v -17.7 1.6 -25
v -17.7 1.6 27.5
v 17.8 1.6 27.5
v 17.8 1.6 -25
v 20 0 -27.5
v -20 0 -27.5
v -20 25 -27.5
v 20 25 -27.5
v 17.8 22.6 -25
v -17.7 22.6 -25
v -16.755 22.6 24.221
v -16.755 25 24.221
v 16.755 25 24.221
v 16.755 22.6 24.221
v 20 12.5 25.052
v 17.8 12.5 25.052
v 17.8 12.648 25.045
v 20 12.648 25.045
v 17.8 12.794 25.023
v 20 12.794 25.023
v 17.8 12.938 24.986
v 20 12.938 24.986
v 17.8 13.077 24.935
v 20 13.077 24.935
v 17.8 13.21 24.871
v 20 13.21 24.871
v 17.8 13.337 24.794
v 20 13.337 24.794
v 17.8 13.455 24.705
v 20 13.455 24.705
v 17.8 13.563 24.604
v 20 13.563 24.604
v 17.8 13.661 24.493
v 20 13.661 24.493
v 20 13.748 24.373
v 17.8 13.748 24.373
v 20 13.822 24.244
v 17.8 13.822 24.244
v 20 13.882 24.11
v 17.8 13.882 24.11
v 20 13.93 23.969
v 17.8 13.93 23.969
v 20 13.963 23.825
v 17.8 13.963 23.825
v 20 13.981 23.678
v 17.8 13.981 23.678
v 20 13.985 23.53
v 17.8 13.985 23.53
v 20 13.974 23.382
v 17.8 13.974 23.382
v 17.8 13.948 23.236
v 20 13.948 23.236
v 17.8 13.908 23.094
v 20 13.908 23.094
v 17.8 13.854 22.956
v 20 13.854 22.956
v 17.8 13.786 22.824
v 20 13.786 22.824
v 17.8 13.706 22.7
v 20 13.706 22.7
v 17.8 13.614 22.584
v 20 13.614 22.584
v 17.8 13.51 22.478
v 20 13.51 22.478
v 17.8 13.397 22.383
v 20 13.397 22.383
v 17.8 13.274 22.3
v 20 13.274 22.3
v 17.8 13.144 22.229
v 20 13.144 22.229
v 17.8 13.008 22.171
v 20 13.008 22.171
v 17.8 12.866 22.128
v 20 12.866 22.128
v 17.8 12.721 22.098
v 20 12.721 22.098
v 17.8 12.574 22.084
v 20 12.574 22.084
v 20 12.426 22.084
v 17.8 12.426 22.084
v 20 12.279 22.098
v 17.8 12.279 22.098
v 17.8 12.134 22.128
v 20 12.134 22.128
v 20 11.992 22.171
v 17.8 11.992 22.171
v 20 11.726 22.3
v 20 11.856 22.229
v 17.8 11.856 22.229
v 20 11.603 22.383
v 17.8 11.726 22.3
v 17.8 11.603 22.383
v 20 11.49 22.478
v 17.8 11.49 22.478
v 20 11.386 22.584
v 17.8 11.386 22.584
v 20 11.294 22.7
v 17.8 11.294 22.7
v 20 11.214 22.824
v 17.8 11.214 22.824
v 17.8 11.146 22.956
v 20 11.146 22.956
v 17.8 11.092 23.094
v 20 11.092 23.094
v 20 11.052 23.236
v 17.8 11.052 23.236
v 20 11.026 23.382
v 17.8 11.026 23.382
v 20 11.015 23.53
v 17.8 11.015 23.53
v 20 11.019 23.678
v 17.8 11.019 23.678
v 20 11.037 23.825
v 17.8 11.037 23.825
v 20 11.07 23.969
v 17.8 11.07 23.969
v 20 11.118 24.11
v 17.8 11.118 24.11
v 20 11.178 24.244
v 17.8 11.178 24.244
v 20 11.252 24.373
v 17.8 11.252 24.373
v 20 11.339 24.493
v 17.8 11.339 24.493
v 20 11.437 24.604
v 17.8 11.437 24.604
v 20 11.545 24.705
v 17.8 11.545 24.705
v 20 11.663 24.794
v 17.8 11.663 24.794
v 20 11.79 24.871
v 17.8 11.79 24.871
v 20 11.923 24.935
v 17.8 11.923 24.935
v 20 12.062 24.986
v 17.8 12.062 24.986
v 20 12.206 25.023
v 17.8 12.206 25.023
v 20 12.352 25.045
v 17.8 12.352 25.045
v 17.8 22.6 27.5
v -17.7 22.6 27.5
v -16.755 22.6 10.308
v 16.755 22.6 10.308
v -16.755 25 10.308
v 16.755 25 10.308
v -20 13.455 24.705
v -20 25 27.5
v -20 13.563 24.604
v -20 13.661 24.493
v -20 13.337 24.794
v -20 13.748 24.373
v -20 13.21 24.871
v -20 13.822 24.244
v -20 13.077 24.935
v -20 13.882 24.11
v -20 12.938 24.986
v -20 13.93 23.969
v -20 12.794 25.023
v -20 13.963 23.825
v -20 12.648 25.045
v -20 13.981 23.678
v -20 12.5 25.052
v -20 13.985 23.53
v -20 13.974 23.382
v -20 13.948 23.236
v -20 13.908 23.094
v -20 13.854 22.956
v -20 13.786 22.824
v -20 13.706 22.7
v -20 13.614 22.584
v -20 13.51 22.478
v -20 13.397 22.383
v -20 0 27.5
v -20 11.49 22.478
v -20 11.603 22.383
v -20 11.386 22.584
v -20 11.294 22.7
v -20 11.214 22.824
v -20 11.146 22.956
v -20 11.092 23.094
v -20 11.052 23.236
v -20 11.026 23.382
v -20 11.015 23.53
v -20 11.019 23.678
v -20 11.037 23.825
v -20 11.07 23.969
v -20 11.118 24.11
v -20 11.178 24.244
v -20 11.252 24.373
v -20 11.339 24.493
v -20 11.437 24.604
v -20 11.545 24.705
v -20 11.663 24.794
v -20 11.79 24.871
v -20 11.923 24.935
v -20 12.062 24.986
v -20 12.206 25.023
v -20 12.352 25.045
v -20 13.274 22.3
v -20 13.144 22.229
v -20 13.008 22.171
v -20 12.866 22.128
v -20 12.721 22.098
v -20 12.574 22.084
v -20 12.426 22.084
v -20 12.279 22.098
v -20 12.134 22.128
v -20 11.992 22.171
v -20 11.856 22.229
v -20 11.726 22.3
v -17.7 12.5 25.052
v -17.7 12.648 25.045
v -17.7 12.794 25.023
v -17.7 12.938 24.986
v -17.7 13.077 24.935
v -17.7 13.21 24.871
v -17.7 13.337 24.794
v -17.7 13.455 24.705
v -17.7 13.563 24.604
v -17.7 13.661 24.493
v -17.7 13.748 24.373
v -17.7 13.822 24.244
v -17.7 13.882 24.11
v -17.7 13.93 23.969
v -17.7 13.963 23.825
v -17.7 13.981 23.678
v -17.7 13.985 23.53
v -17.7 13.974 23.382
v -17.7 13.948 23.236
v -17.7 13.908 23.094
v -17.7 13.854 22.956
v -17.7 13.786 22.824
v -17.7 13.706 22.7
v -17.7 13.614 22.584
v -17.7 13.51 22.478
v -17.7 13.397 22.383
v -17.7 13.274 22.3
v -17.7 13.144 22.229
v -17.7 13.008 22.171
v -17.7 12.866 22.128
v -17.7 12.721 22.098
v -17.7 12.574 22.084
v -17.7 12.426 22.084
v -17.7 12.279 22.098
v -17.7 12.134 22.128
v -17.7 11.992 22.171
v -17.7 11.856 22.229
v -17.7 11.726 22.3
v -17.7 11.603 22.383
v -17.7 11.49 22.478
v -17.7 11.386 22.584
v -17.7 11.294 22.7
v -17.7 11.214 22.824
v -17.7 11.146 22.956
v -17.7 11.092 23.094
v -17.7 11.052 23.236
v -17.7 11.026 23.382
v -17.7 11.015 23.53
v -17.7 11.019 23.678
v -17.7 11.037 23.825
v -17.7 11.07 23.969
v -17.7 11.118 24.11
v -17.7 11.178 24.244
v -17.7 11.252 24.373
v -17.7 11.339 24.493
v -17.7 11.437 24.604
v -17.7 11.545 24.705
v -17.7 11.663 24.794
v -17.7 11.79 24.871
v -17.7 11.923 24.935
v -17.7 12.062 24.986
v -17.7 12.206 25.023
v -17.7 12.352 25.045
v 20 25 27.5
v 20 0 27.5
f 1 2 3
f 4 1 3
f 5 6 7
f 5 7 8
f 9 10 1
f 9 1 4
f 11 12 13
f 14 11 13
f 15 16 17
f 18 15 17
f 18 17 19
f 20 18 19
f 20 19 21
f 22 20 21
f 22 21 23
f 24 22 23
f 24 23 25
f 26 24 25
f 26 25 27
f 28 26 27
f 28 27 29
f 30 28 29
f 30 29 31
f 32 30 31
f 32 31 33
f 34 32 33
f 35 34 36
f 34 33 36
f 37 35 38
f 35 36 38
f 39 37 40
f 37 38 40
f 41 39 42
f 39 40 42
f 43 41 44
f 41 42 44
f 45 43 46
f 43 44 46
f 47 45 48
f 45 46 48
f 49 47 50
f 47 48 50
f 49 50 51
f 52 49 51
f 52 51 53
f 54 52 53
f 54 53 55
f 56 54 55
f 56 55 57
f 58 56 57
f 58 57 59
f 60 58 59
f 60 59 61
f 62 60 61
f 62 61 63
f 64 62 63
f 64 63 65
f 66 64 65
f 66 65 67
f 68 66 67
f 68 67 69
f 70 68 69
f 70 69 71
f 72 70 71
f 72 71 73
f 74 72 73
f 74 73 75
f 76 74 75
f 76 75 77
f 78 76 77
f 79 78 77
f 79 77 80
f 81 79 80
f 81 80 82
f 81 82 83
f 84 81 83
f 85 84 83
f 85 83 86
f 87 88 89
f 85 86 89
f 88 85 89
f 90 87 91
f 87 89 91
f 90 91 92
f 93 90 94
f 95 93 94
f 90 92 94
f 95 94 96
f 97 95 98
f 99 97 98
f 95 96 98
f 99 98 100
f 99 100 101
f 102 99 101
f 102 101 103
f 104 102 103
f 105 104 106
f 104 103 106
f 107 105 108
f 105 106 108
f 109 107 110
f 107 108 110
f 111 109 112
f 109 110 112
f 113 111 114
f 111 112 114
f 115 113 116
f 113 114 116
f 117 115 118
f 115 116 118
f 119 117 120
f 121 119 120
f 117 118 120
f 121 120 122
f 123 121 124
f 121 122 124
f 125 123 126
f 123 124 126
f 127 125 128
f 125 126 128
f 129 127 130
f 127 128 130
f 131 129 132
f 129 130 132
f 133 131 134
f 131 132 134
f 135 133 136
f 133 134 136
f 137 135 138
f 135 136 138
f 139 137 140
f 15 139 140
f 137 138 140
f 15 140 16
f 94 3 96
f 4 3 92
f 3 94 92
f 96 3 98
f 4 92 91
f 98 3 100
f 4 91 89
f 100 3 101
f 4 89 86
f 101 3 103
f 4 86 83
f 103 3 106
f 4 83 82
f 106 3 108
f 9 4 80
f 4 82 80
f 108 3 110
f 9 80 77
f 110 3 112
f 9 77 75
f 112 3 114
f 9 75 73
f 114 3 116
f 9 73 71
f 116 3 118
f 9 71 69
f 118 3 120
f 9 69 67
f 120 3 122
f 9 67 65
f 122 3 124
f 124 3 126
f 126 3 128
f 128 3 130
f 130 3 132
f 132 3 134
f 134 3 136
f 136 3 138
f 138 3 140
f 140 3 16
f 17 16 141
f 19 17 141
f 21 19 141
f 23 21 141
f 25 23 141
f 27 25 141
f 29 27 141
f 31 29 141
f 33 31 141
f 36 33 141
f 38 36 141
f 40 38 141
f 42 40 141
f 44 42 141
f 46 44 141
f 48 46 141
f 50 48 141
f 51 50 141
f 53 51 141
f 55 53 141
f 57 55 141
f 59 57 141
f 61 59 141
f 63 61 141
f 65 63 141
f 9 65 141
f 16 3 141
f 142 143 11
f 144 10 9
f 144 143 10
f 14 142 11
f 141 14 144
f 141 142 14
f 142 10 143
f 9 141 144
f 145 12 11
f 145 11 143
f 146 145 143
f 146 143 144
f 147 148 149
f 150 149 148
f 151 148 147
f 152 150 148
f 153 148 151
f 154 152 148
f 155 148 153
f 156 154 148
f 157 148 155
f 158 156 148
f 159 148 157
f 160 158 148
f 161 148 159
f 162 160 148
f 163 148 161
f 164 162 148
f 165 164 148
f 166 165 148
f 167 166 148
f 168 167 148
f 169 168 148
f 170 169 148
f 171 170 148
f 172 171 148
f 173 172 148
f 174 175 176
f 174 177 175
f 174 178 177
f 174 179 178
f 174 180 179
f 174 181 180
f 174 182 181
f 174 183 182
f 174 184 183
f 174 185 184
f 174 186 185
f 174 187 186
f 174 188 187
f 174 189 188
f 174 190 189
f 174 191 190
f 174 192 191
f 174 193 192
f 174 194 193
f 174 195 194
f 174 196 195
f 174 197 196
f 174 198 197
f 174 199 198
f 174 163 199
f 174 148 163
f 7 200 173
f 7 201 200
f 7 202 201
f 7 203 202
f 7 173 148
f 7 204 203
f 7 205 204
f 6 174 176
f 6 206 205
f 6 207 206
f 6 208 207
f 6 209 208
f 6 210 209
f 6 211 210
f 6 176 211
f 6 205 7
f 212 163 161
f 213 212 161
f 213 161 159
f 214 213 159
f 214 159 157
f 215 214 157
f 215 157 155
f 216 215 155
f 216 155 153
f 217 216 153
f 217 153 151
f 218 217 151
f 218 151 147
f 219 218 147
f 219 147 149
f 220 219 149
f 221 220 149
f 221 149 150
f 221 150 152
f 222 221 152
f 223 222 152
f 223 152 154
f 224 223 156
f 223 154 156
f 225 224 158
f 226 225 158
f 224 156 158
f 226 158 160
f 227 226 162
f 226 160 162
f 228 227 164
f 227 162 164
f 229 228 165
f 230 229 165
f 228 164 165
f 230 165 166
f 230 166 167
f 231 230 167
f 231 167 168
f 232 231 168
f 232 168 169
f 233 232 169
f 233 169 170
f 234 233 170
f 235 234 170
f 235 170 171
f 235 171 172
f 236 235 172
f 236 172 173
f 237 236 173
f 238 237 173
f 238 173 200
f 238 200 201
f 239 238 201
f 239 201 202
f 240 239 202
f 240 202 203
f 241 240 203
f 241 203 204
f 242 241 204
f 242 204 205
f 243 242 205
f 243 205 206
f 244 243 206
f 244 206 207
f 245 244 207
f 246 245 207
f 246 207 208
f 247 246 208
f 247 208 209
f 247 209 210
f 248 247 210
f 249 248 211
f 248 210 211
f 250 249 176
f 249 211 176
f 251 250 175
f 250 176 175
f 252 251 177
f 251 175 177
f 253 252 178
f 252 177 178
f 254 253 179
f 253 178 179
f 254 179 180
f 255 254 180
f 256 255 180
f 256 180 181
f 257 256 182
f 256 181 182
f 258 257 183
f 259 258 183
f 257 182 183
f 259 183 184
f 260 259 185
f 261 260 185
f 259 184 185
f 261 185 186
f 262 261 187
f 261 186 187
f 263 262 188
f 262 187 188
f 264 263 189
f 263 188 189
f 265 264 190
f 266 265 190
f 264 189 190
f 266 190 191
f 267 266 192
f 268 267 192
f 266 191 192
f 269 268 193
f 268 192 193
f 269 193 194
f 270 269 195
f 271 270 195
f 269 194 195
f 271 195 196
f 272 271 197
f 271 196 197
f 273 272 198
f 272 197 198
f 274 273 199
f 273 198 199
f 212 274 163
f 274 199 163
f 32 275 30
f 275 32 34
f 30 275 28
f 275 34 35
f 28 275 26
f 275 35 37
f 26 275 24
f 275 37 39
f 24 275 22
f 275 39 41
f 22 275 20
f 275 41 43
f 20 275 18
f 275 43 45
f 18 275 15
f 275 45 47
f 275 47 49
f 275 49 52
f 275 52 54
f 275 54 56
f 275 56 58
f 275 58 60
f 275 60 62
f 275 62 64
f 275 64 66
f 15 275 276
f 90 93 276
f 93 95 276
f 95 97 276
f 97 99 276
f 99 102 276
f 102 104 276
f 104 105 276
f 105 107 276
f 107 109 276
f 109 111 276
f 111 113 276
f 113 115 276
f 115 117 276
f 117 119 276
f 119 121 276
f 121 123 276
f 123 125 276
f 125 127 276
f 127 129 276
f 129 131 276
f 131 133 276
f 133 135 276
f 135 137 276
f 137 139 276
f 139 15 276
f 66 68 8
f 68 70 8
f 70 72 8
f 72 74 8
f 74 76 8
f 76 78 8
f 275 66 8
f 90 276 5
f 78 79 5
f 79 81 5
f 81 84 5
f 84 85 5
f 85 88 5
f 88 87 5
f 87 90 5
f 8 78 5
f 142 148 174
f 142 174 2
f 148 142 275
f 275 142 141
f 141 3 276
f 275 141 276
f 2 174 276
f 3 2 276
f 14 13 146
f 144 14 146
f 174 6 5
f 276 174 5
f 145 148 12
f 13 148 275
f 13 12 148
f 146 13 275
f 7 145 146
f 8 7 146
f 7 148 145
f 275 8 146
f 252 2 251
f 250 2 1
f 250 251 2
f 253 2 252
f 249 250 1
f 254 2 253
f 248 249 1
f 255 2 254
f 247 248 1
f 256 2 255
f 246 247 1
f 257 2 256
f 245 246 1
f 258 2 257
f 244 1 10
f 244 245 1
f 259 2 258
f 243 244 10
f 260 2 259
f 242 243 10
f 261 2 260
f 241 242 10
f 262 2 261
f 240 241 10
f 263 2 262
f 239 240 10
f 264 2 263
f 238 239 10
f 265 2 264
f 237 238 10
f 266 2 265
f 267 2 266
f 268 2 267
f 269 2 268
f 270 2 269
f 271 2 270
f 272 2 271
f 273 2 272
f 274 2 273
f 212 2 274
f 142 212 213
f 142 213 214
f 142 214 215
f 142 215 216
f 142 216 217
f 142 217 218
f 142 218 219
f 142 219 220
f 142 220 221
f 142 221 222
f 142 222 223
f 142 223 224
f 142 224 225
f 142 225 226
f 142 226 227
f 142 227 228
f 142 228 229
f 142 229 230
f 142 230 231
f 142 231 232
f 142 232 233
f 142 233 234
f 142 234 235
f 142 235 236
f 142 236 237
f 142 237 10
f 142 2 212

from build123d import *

# Parameters (mm, degrees)
SKETCH1_W           = 40
SKETCH1_H           = 55
BOSS_EXTRUDE1_DEPTH = 25
SKETCH2_W           = 35.5
SKETCH2_H           = 21
CUT_EXTRUDE1_DEPTH  = 52.5
SKETCH3_R           = 1.485145447
CUT_EXTRUDE2_DEPTH  = 52.5
SKETCH5_W           = 33.510072246
SKETCH5_H           = 13.913042654
CUT_EXTRUDE3_DEPTH  = 20


with BuildPart() as part:
    # Sketch1 → Boss-Extrude1 (new body)
    with BuildSketch(Plane(origin=(0, 0, 0), x_dir=(1, 0, 0), z_dir=(0, 1, 0))):
        Rectangle(SKETCH1_W, SKETCH1_H)
    extrude(amount=BOSS_EXTRUDE1_DEPTH)

    # Sketch2 → Cut-Extrude1 (cut)
    with BuildSketch(Plane.XY.offset(27.5)):
        with Locations((0.05, 12.1)):
            Rectangle(SKETCH2_W, SKETCH2_H)
    extrude(amount=-CUT_EXTRUDE1_DEPTH, mode=Mode.SUBTRACT)

    # Sketch3 → Cut-Extrude2 (cut)
    with BuildSketch(Plane.ZY.offset(20)):
        with Locations((23.566951269, 12.5)):
            Circle(SKETCH3_R)
    extrude(amount=-CUT_EXTRUDE2_DEPTH, mode=Mode.SUBTRACT)

    # Sketch5 → Cut-Extrude3 (cut)
    with BuildSketch(Plane(origin=(0, 25, 0), x_dir=(1, 0, 0), z_dir=(0, 1, 0))):
        with Locations((0, -17.264049878)):
            Rectangle(SKETCH5_W, SKETCH5_H)
    extrude(amount=-CUT_EXTRUDE3_DEPTH, mode=Mode.SUBTRACT)


solid = part.part
